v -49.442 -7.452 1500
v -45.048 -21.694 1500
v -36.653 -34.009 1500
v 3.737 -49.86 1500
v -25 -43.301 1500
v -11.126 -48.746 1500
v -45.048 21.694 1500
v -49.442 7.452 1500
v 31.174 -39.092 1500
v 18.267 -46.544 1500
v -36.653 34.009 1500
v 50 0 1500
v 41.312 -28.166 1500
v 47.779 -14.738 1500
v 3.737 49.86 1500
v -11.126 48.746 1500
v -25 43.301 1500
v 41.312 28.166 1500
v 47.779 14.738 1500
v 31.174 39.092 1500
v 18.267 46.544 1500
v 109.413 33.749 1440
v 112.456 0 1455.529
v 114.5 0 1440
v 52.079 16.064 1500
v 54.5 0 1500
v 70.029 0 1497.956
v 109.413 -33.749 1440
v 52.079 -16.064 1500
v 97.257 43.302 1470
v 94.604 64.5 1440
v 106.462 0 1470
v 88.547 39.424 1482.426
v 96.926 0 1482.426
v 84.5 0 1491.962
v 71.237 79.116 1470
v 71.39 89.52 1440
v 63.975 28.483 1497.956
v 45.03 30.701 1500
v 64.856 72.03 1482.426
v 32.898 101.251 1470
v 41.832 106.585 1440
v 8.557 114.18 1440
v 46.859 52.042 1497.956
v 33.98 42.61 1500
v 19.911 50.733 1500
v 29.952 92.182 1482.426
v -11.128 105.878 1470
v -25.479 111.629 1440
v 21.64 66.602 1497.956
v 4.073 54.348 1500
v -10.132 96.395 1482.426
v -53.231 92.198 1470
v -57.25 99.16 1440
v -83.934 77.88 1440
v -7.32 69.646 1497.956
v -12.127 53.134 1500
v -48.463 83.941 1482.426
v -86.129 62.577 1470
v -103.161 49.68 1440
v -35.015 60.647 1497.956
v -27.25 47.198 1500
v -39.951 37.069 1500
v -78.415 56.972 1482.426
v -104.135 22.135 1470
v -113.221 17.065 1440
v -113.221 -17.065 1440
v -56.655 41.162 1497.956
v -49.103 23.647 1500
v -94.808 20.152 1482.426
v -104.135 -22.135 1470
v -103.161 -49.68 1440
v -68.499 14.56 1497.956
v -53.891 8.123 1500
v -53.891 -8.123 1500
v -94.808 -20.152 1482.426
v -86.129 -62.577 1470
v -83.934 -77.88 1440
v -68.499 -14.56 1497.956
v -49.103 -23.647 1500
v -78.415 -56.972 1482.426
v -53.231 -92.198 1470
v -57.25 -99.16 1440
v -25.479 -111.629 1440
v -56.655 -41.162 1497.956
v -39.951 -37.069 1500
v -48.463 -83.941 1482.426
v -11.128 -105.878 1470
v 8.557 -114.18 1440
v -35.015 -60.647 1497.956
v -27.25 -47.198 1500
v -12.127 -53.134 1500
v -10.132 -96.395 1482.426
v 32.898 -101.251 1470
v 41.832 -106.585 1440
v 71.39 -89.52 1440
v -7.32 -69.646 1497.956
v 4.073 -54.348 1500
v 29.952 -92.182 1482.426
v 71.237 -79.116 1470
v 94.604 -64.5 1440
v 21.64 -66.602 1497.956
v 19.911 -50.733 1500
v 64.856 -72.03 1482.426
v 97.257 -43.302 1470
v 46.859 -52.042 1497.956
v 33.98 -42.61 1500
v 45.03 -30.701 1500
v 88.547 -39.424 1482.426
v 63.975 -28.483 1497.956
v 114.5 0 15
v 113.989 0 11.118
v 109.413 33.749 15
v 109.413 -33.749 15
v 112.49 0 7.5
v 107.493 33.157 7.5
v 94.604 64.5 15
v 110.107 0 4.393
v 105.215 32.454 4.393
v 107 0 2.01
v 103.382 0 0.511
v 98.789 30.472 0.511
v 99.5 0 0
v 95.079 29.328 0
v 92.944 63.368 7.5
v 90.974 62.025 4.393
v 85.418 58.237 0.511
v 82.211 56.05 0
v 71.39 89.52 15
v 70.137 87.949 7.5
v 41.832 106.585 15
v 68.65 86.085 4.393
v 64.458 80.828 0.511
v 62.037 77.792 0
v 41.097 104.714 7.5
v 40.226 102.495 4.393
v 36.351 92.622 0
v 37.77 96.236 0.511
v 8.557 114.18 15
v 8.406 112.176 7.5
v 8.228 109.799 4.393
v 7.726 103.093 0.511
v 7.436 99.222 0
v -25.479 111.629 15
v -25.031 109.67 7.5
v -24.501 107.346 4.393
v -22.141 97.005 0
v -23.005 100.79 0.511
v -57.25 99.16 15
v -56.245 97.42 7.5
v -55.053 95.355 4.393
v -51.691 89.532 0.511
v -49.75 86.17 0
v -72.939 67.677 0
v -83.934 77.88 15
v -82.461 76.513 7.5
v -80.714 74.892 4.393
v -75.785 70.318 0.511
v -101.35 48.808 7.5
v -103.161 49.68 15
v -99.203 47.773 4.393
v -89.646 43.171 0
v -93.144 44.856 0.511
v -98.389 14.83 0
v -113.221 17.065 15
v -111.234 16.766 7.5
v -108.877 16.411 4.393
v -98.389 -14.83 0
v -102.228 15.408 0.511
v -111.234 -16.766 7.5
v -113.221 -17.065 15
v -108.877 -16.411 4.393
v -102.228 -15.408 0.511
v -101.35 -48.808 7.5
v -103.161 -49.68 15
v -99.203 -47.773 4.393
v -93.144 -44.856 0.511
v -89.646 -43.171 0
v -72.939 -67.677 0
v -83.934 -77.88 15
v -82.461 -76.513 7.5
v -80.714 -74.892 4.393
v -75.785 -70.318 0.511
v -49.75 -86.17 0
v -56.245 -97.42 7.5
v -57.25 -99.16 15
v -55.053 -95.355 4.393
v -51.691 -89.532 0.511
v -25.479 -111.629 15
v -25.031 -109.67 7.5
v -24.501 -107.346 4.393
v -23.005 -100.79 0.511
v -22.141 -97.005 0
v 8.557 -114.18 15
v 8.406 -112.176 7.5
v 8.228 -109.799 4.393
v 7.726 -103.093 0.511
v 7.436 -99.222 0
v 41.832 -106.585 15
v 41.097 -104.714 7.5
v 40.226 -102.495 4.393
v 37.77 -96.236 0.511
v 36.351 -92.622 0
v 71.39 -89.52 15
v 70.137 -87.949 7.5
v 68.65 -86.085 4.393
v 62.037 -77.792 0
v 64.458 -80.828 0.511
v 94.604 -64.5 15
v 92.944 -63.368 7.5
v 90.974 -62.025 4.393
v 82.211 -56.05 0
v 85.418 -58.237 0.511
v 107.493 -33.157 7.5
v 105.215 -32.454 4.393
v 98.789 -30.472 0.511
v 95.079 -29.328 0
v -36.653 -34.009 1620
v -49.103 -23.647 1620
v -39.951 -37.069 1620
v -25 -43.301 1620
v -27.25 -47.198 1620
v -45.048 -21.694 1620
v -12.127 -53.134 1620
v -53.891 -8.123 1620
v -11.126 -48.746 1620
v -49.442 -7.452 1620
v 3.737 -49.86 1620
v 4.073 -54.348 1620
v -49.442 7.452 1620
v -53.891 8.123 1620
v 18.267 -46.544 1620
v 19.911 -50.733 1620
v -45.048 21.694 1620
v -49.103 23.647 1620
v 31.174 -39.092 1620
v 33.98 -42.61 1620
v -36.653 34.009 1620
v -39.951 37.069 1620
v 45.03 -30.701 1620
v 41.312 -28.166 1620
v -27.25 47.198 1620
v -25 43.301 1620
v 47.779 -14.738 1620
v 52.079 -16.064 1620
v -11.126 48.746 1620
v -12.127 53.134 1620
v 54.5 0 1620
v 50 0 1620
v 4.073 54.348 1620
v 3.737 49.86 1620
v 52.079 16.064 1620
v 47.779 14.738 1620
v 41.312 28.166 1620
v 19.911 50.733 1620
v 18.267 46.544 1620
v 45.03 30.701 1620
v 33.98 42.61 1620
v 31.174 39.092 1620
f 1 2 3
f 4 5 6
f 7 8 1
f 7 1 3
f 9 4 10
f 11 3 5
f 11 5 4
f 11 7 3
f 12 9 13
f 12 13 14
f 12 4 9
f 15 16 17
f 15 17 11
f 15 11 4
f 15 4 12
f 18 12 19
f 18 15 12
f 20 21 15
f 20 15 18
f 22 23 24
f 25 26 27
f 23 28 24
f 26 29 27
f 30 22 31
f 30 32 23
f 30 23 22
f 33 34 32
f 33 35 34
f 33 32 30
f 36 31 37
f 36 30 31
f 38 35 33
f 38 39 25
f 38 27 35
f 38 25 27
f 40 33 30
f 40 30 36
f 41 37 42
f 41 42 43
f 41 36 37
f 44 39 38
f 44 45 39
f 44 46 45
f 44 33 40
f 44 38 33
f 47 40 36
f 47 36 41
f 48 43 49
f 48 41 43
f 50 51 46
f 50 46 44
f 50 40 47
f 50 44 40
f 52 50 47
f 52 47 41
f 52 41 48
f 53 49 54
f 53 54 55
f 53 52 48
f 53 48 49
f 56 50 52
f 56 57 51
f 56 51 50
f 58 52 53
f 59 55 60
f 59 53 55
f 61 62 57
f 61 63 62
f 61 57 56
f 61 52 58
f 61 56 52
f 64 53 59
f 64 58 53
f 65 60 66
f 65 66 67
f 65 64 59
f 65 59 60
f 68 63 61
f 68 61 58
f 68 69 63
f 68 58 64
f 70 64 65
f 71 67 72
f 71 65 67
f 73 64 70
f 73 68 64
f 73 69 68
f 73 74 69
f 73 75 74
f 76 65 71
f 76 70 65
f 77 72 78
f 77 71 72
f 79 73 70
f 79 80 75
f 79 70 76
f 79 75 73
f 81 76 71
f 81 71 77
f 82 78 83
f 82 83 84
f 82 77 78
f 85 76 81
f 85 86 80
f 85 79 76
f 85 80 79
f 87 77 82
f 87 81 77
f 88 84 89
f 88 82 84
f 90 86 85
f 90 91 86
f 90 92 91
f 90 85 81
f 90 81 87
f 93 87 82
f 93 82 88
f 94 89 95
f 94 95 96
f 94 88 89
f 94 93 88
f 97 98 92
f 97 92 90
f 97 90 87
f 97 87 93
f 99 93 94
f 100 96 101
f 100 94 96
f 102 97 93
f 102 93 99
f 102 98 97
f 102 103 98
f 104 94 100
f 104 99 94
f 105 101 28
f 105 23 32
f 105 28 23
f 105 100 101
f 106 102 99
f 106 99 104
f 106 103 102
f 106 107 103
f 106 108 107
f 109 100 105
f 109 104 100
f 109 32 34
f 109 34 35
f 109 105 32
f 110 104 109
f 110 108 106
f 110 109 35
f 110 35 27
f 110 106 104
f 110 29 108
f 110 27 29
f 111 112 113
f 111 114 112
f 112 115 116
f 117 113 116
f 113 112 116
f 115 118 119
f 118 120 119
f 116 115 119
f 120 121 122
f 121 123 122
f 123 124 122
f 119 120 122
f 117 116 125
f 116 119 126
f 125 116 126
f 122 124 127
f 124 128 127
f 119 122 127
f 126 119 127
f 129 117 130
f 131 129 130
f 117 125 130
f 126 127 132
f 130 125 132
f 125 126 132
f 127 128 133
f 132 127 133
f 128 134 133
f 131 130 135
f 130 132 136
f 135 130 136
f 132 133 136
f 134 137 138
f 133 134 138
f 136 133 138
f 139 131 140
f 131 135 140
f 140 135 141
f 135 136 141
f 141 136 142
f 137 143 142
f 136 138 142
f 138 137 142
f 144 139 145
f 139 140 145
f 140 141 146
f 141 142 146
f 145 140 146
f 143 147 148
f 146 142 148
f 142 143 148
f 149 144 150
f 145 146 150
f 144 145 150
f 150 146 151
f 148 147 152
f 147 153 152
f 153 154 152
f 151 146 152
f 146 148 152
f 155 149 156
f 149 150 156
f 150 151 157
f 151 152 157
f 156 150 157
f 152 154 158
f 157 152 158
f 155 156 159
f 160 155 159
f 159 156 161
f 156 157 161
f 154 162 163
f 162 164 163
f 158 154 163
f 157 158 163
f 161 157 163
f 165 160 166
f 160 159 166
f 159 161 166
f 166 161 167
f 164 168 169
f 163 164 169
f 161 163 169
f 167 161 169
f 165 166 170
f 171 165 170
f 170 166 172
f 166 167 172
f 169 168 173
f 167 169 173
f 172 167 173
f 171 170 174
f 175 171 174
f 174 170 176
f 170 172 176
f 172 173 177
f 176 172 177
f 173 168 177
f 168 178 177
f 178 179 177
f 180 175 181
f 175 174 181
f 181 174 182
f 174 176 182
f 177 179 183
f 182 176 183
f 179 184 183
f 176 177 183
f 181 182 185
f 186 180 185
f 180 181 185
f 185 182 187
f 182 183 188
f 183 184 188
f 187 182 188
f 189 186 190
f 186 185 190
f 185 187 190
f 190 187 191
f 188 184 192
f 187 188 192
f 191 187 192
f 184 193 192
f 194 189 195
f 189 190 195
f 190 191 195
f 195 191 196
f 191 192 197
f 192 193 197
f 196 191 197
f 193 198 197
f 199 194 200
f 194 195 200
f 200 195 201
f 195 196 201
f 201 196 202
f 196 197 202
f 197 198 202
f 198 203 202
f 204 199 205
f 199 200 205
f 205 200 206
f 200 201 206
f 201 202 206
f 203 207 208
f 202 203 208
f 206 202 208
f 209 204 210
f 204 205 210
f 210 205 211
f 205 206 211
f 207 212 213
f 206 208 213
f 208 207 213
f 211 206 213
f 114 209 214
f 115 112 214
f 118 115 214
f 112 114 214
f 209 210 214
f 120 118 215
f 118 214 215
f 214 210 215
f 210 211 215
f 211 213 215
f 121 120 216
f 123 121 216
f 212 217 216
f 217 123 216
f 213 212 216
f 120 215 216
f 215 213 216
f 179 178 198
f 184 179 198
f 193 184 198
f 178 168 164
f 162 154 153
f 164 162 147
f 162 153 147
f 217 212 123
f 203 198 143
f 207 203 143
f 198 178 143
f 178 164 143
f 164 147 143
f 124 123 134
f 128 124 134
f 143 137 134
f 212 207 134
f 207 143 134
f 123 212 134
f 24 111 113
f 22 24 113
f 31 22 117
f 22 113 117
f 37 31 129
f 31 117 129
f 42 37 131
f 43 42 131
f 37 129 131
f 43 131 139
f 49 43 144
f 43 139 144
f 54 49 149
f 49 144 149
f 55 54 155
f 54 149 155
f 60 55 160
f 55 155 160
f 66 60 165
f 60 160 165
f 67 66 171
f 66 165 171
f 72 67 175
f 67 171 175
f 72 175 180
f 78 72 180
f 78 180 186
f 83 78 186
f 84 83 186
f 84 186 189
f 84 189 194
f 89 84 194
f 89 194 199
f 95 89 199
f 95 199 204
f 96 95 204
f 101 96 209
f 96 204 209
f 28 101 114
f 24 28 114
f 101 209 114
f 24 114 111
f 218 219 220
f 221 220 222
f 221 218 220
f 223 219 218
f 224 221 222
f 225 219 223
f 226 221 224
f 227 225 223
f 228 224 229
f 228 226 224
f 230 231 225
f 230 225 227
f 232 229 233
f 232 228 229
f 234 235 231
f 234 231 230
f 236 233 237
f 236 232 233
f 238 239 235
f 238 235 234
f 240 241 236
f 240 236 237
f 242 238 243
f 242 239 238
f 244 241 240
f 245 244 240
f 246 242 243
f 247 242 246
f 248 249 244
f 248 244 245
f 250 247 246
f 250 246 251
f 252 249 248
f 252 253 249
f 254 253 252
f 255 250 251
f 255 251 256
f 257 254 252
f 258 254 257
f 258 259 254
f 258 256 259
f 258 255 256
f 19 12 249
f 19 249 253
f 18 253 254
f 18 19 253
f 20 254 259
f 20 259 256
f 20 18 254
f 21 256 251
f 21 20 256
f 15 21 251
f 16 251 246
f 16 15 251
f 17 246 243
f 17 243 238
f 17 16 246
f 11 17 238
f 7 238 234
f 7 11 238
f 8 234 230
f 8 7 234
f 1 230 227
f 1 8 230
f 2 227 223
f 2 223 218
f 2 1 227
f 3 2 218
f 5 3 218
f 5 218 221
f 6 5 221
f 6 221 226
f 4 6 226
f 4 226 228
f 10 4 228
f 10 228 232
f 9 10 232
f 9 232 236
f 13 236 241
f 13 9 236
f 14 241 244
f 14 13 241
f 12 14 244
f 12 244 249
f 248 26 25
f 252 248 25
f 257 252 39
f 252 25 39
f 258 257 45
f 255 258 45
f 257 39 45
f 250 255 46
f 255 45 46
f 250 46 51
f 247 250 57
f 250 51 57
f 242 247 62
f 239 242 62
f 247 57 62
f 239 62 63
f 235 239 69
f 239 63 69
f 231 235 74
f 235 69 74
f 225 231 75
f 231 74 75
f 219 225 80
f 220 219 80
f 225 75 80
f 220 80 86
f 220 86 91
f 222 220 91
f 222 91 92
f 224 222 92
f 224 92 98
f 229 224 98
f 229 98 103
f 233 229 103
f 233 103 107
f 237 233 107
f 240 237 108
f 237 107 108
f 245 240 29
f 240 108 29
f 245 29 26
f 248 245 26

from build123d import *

# Parameters (mm, degrees)
F0_R     = 114.5
F1_DEPTH = 1500
F2_R     = 60
F3_R     = 15
F4_R     = 54.5
F4_R_2   = 50
F5_DEPTH = 120


with BuildPart() as f1:
    # F0 (on Top) → F1 (new body)
    with BuildSketch(Plane.XY):
        Circle(F0_R)
    extrude(amount=F1_DEPTH)

    # F2
    f2_edges = [f1.edges().sort_by_distance(p)[0] for p in [
        (-114.5, 0, 1500),
    ]]
    fillet(f2_edges, radius=F2_R)

    # F3
    f3_edges = [f1.edges().sort_by_distance(p)[0] for p in [
        (-114.5, 0, 0),
    ]]
    fillet(f3_edges, radius=F3_R)

    # F4 (on face) → F5 (join)
    with BuildSketch(Plane.XY.offset(1500)):
        Circle(F4_R)
        Circle(F4_R_2, mode=Mode.SUBTRACT)
    extrude(amount=F5_DEPTH)


solid = f1.part
